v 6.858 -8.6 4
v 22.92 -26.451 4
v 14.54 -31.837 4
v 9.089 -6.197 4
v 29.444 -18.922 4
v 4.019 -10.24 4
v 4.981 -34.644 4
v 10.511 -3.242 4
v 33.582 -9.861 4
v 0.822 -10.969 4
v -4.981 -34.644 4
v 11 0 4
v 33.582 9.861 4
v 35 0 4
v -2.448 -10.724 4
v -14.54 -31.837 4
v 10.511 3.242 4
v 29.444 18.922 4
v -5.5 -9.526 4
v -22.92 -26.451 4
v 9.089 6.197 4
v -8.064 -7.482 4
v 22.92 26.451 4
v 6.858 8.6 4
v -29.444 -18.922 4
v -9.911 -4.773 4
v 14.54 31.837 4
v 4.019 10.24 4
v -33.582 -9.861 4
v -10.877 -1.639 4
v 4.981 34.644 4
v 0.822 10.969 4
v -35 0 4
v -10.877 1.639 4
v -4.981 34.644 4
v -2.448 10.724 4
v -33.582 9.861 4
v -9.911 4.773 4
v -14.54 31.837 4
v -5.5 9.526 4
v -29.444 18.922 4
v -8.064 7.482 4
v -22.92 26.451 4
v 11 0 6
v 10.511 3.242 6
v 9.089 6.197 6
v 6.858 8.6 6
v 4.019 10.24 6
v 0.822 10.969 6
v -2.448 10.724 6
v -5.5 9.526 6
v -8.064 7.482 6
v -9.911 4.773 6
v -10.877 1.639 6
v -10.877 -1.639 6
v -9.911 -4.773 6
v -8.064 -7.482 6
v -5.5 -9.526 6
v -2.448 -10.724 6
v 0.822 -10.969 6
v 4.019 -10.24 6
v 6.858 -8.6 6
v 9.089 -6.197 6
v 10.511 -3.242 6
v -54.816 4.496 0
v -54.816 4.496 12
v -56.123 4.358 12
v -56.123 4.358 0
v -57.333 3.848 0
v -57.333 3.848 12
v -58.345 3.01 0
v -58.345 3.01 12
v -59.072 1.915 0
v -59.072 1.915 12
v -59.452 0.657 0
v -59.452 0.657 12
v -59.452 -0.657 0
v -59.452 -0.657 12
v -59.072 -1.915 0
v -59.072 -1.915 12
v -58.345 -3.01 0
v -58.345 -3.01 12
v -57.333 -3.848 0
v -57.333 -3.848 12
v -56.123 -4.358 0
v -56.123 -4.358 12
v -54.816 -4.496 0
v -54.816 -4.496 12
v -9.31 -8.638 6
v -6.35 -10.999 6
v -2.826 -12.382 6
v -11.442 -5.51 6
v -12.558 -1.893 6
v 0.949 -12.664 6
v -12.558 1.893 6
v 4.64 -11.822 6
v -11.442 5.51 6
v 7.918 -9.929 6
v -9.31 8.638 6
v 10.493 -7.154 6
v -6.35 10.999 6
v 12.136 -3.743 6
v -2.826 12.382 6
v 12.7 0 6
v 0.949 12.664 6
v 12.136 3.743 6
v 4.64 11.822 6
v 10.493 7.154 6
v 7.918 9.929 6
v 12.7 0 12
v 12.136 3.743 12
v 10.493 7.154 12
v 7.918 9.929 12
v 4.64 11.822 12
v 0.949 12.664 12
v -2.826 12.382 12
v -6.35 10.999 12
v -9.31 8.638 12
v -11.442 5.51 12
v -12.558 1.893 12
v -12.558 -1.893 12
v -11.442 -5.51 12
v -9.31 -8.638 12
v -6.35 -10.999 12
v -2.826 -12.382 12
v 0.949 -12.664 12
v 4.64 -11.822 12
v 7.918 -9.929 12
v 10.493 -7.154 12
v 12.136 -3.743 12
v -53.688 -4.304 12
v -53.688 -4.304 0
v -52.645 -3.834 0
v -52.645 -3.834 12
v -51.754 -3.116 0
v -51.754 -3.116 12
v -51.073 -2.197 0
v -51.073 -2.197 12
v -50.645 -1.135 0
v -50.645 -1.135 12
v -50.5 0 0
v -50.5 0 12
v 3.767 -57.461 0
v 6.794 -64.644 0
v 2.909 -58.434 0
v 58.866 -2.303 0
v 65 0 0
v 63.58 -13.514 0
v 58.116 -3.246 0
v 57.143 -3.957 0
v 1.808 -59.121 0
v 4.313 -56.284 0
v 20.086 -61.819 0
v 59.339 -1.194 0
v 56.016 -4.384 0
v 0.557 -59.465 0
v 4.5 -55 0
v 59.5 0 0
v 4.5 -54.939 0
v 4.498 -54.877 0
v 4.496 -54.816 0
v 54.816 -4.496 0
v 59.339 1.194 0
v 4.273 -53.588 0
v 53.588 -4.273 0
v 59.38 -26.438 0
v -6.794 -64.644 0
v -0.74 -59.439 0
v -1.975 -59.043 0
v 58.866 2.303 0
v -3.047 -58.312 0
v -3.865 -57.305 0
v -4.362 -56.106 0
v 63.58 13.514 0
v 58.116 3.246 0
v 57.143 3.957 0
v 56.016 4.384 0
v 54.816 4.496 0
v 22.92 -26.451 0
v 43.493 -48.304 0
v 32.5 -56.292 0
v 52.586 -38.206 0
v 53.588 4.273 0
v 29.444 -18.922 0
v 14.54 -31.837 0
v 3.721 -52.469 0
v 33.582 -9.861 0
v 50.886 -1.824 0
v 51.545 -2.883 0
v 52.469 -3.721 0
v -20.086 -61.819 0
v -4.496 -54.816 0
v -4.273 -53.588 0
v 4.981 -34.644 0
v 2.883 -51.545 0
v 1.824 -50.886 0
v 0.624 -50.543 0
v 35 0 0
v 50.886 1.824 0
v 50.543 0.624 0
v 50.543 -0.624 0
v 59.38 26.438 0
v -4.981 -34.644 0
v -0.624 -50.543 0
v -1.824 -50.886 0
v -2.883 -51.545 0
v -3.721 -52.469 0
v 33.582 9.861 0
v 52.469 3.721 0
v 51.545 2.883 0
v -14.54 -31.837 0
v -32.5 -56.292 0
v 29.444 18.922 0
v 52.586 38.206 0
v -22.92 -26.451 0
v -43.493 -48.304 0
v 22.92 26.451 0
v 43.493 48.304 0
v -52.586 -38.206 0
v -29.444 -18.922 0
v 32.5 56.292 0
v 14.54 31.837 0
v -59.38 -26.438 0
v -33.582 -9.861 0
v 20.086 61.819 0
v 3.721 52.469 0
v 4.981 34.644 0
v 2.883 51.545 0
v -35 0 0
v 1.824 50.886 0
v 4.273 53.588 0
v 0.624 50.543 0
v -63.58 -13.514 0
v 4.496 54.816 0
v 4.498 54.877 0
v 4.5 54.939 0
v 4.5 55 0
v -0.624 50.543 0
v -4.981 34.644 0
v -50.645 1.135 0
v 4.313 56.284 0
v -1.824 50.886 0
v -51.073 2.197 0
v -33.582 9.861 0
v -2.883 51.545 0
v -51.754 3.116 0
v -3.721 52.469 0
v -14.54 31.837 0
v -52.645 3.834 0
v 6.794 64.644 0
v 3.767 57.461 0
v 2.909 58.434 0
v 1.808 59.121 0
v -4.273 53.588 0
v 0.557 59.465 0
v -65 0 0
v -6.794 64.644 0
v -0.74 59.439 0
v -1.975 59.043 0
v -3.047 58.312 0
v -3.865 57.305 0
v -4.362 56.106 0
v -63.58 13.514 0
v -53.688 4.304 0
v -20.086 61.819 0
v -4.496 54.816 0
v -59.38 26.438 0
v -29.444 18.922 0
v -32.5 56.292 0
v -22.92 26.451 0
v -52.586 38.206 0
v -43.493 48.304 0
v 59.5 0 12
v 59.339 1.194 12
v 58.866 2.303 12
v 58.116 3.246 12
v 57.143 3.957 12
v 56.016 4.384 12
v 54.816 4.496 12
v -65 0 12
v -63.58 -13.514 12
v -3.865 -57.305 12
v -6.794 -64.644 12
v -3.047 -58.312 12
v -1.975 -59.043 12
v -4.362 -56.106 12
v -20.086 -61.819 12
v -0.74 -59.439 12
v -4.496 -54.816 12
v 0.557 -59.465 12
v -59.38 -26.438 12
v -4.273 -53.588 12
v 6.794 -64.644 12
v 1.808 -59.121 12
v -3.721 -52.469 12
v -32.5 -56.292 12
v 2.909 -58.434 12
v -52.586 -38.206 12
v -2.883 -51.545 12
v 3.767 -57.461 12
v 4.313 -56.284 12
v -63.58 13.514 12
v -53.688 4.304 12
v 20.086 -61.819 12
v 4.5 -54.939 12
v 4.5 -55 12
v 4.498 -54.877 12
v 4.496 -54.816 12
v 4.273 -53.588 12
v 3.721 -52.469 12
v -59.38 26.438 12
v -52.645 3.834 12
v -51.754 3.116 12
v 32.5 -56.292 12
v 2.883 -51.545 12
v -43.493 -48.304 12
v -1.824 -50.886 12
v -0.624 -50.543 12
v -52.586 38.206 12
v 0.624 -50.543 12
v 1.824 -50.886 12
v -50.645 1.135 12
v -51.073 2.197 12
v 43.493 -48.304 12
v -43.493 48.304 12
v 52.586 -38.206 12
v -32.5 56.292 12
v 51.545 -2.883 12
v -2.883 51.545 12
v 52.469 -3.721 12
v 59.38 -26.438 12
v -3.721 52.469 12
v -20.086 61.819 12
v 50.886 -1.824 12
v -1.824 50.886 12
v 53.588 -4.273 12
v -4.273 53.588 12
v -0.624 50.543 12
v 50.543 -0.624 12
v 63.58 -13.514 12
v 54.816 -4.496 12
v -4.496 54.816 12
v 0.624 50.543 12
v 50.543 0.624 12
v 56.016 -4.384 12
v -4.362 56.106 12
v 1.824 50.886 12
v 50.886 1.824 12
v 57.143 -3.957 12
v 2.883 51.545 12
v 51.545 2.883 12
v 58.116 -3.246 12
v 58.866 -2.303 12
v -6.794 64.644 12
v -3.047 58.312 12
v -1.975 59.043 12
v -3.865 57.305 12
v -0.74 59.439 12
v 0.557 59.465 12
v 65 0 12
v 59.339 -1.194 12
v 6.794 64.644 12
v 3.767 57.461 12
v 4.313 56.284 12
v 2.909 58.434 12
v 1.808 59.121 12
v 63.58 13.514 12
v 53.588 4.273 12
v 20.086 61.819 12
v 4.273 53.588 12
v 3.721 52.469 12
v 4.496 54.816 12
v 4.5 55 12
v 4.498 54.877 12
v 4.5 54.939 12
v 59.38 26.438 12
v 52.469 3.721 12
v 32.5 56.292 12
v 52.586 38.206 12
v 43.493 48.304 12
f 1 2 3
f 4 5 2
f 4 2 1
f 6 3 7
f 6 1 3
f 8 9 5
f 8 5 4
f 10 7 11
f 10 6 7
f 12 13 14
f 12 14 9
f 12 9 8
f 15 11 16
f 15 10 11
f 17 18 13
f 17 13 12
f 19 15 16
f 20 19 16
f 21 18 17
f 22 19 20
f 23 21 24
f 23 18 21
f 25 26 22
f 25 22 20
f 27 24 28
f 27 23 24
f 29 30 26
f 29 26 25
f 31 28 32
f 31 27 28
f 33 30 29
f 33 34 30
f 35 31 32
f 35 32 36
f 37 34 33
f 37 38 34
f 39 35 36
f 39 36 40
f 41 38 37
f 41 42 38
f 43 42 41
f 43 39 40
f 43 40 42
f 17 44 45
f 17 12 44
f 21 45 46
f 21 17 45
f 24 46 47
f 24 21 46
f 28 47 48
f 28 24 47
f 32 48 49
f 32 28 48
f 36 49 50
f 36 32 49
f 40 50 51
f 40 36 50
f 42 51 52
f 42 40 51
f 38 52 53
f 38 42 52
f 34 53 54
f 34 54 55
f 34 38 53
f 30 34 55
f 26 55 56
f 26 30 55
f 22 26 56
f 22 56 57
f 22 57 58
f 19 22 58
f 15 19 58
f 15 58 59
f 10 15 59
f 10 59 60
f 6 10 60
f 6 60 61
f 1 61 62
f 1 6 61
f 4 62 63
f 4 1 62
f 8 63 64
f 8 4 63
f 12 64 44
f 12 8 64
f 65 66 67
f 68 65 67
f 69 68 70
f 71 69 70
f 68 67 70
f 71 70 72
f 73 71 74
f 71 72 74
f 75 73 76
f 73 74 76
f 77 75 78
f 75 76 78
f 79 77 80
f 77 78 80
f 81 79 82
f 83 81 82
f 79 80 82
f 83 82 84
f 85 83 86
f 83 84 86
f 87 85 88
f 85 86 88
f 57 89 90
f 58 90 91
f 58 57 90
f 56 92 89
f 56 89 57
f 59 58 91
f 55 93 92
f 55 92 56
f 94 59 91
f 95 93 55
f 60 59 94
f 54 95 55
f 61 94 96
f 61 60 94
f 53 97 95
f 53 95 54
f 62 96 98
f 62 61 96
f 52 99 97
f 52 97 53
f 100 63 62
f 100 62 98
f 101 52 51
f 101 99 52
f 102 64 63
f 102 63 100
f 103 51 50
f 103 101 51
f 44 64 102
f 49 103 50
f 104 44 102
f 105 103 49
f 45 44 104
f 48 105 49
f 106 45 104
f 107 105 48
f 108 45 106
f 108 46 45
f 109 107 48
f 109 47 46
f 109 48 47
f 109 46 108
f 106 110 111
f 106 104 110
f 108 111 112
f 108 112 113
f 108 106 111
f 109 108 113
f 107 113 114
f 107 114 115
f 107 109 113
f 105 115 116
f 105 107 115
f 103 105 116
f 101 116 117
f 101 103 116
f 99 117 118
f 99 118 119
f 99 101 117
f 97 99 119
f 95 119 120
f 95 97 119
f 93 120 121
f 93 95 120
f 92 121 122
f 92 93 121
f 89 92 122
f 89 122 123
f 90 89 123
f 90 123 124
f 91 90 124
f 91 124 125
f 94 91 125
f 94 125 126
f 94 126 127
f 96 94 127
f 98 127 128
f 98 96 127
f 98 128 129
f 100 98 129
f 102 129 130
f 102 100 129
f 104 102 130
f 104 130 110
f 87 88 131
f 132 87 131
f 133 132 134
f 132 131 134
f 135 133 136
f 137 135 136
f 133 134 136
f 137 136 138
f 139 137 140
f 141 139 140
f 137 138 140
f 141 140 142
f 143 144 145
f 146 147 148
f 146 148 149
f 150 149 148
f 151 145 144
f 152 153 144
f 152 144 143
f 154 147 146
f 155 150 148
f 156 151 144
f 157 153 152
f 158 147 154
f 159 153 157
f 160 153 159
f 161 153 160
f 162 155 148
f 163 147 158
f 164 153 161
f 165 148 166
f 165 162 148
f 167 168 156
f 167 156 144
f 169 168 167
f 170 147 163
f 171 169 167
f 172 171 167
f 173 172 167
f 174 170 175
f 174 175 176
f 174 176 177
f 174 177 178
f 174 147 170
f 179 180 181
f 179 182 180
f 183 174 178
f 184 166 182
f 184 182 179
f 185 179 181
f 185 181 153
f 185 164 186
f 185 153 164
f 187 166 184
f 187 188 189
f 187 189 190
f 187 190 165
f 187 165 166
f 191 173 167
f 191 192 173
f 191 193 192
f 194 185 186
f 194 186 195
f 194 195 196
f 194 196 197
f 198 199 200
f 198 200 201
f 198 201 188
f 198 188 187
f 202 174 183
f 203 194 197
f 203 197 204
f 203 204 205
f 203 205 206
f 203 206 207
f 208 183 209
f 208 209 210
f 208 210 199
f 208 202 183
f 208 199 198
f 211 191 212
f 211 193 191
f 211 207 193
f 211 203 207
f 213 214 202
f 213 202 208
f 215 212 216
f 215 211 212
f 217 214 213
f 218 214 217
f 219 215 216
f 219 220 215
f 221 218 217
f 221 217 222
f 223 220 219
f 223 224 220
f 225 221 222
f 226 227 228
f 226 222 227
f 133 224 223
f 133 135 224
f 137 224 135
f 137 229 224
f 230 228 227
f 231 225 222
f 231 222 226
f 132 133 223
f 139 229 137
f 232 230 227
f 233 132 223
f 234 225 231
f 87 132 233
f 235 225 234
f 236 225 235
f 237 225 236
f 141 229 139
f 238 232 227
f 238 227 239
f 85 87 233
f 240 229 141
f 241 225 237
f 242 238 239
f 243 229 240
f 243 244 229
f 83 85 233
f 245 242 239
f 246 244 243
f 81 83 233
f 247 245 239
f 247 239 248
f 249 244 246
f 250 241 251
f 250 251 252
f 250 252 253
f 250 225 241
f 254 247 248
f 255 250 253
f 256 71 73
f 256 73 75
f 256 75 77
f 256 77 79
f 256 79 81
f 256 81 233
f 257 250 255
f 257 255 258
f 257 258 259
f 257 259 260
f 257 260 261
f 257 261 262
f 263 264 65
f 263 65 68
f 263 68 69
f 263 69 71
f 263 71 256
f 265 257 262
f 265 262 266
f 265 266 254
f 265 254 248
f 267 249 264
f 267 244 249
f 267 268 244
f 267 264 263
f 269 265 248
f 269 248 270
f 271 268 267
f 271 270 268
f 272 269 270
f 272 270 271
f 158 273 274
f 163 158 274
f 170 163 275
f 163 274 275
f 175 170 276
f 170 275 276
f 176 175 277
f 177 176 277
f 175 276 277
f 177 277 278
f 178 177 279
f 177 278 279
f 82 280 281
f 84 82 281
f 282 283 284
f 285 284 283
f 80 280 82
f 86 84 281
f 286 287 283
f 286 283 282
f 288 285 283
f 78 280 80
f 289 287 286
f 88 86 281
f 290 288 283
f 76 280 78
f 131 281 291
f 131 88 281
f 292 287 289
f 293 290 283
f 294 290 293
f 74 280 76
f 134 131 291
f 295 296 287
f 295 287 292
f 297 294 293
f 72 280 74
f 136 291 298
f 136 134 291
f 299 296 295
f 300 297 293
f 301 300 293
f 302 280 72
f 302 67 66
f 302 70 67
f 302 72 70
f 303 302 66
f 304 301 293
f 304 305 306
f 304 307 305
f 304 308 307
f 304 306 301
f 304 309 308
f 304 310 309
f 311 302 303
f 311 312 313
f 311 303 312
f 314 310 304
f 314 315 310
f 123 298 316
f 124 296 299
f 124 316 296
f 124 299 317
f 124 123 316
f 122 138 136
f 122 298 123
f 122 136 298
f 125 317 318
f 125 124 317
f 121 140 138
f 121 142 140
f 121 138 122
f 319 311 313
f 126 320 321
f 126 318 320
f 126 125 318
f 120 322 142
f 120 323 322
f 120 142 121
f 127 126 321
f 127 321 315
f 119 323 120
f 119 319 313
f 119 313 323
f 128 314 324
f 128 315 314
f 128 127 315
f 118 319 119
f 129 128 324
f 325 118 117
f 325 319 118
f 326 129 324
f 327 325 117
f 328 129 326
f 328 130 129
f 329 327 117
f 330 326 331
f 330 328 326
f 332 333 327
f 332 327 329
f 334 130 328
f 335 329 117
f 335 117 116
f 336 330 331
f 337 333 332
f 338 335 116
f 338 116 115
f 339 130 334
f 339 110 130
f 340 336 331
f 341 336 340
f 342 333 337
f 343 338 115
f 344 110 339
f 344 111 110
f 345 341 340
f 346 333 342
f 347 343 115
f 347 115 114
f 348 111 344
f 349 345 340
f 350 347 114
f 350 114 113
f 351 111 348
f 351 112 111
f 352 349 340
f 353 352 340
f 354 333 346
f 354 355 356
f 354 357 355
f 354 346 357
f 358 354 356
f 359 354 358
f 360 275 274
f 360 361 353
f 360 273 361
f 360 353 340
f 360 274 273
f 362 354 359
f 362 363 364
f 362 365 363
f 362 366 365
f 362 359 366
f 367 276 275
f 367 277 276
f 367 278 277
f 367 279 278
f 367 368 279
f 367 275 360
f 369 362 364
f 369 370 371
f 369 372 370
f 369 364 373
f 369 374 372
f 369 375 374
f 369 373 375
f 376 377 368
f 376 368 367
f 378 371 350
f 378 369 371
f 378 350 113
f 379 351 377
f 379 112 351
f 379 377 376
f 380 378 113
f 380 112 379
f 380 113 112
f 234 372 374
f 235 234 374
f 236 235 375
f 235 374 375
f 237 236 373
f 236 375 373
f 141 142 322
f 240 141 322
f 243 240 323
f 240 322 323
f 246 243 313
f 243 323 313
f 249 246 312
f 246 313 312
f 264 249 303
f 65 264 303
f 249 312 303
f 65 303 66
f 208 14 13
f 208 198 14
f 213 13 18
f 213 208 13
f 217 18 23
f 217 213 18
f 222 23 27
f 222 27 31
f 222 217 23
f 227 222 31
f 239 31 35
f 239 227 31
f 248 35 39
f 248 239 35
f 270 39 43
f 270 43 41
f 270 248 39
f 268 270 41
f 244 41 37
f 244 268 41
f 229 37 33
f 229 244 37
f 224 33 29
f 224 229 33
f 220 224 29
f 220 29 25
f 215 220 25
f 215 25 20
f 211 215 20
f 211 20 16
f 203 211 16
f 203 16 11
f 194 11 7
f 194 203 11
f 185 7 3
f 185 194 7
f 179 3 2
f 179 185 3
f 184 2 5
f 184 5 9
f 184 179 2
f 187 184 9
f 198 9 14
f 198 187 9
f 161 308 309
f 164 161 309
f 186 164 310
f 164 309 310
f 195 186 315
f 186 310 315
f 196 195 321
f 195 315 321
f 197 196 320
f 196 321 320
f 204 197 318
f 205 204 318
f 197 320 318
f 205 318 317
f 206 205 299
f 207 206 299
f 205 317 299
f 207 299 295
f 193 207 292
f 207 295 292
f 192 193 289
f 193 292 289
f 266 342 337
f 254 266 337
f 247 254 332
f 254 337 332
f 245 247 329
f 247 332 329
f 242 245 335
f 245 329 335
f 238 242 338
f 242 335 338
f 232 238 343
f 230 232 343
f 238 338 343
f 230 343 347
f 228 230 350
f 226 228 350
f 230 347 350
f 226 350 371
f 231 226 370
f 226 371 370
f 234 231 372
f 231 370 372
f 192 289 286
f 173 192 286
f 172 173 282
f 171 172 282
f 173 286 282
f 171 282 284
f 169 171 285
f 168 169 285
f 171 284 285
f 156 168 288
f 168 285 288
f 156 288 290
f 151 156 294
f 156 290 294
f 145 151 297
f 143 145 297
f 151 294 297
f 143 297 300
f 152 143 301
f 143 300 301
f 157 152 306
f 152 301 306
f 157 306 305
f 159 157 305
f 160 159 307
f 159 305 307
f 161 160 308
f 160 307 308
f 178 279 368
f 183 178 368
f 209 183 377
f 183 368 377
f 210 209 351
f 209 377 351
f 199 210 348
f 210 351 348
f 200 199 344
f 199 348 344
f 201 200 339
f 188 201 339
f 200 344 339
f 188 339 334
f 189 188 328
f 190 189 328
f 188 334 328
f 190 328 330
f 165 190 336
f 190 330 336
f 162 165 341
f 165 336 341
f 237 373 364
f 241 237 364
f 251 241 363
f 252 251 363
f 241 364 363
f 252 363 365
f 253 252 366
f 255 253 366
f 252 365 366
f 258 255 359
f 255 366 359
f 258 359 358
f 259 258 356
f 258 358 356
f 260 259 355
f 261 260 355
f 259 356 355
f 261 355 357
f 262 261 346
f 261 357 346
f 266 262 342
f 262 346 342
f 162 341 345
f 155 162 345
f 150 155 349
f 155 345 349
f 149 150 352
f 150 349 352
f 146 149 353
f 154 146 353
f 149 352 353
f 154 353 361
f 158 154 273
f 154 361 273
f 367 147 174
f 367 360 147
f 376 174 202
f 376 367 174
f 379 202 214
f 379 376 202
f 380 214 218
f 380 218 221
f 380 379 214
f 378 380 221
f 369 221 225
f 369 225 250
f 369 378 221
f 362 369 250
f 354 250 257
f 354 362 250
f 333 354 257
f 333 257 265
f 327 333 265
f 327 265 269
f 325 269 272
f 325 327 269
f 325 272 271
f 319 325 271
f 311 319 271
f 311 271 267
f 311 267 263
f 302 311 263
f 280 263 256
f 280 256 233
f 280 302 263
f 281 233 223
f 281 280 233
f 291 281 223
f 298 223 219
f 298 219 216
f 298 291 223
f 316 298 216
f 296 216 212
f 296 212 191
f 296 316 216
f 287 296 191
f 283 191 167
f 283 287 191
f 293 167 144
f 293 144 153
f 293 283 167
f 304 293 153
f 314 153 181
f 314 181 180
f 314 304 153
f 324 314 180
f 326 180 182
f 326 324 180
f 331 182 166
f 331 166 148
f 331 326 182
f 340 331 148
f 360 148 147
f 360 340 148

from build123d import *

# Parameters (mm, degrees)
F3_DEPTH = 12


with BuildPart() as f1:
    # F0 (on Front) → F1 (revolve)
    with BuildSketch(Plane.XZ):
        Polygon((35, 4), (35, 0), (65, 0), (65, 12), (12.7, 12), (12.7, 6), (11, 6), (11, 4), align=None)
    revolve(axis=Axis((0, 0, 8.603251), (0, 0, 1)))

    # F2 (on face) → F3 (cut)
    with BuildSketch(Plane.XY.offset(12)):
        with BuildLine():
            ThreePointArc((-4.496233, 54.815909), (0, 50.5), (4.496233, 54.815909))
            ThreePointArc((4.496233, 54.815909), (4.499058, 54.907935), (4.5, 55))
            ThreePointArc((4.5, 55), (-0.092065, 59.499058), (-4.496233, 54.815909))
        make_face()
        with BuildLine():
            ThreePointArc((-50.5, 0), (-51.753586, 3.116215), (-54.815909, 4.496233))
            ThreePointArc((-54.815909, 4.496233), (-59.5, 0), (-54.815909, -4.496233))
            ThreePointArc((-54.815909, -4.496233), (-51.753586, -3.116215), (-50.5, 0))
        make_face()
        with BuildLine():
            ThreePointArc((4.5, -55), (4.499058, -54.907935), (4.496233, -54.815909))
            ThreePointArc((4.496233, -54.815909), (0, -50.5), (-4.496233, -54.815909))
            ThreePointArc((-4.496233, -54.815909), (-0.092065, -59.499058), (4.5, -55))
        make_face()
        with BuildLine():
            ThreePointArc((59.5, 0), (58.116215, 3.246414), (54.815909, 4.496233))
            ThreePointArc((54.815909, 4.496233), (50.5, 0), (54.815909, -4.496233))
            ThreePointArc((54.815909, -4.496233), (58.116215, -3.246414), (59.5, 0))
        make_face()
    extrude(amount=-F3_DEPTH, mode=Mode.SUBTRACT)


solid = f1.part
